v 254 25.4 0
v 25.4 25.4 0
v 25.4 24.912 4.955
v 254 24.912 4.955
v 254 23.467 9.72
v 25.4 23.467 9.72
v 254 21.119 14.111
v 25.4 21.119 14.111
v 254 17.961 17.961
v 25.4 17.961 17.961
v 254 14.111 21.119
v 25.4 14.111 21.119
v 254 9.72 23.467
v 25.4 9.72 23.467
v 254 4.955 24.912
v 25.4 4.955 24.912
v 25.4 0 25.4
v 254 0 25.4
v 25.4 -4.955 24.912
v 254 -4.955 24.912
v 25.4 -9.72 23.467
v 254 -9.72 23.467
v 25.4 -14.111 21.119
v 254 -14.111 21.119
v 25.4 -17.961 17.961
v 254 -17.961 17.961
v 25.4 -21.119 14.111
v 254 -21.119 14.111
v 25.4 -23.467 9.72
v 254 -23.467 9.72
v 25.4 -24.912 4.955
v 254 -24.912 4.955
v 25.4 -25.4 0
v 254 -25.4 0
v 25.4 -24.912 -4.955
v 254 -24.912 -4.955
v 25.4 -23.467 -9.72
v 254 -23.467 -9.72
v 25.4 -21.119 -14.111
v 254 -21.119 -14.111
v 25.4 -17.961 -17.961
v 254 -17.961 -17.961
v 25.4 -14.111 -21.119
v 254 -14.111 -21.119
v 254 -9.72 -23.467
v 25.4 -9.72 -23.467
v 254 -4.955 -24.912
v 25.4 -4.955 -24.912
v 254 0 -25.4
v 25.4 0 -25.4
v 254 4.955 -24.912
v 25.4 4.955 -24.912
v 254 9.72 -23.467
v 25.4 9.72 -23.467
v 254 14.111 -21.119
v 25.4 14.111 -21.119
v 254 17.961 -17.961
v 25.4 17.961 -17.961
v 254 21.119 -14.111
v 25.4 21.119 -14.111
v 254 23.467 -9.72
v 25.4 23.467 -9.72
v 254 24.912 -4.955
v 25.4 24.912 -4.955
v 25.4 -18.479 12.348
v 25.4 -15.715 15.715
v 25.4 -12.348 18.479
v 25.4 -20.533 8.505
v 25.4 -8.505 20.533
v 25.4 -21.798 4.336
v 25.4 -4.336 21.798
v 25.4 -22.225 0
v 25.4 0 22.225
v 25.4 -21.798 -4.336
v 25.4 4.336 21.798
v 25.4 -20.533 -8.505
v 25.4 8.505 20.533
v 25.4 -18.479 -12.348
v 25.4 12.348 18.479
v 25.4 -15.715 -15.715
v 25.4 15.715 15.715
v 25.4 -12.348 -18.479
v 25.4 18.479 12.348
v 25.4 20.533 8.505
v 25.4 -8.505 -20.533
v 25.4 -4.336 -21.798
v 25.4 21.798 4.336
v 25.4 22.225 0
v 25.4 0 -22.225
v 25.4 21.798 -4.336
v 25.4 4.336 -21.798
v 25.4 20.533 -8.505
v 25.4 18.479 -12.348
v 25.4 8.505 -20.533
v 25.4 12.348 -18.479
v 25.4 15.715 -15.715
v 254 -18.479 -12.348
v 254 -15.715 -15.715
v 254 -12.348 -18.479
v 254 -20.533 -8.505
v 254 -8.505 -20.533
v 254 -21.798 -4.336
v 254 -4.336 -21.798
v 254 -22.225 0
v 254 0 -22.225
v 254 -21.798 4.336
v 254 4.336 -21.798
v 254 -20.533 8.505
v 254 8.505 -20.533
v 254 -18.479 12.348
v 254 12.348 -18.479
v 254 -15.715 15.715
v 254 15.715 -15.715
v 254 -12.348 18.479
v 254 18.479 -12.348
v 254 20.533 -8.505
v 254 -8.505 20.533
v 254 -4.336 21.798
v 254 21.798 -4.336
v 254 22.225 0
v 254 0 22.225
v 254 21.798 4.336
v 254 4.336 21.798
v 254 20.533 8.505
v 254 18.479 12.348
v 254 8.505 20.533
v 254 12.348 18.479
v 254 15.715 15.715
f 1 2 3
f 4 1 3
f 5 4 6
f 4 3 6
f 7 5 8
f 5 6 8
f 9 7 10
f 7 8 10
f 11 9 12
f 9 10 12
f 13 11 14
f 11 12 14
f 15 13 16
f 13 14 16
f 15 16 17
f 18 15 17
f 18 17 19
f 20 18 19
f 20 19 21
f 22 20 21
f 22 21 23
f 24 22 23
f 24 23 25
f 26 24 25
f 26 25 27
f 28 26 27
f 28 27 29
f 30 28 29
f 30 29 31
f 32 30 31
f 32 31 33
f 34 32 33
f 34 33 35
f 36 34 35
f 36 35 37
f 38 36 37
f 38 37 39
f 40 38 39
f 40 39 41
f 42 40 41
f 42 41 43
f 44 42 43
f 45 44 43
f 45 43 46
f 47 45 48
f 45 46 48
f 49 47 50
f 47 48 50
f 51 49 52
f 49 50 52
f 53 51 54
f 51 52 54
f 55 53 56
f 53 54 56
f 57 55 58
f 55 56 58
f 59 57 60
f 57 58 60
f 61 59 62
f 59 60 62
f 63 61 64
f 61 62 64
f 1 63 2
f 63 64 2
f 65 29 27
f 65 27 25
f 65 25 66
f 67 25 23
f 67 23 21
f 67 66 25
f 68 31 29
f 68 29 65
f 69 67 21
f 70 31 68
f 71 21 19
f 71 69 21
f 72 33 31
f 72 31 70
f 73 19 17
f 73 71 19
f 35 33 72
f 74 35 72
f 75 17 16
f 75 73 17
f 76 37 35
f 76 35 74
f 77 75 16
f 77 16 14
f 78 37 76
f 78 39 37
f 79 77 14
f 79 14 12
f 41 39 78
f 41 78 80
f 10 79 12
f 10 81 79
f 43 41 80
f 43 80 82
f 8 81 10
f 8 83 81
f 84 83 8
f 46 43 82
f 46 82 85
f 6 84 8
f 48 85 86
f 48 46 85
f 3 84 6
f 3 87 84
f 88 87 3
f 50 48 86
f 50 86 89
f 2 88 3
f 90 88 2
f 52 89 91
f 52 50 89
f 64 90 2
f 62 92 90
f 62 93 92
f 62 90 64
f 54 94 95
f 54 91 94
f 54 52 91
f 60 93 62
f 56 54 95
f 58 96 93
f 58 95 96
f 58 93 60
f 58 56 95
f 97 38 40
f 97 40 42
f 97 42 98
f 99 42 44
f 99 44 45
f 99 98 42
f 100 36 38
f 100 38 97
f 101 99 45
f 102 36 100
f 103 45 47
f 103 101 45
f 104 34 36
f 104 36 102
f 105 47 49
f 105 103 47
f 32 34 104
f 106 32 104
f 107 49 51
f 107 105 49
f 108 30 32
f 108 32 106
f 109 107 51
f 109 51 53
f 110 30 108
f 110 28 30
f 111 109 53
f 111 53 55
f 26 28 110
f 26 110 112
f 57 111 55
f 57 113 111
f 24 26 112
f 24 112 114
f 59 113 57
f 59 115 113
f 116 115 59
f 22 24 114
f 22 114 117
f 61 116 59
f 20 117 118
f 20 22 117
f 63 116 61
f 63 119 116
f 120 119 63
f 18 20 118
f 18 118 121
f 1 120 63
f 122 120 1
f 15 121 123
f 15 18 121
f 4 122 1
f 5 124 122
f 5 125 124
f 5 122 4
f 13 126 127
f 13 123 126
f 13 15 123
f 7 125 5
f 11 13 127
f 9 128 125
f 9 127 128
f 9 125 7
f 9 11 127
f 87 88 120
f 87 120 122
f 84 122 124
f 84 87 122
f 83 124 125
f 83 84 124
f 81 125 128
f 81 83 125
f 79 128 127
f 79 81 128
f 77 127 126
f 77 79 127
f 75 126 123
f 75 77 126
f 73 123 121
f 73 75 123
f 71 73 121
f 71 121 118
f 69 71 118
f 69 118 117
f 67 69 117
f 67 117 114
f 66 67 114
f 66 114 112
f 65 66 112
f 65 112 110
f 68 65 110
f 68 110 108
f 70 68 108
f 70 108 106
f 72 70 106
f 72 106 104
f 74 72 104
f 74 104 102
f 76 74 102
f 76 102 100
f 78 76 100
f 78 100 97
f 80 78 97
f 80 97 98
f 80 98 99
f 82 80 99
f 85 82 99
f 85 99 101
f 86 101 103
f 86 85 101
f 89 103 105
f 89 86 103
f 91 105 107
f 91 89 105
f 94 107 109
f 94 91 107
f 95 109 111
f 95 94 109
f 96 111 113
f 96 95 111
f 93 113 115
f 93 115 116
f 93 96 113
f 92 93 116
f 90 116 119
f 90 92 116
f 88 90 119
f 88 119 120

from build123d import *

# Parameters (mm, degrees)
F0_R      = 25.4
F1_DEPTH  = 254
F2_T      = -3.175
F1_FACE_R = 25.4
F3_DEPTH  = 25.4


with BuildPart() as f1:
    # F0 (on Right) → F1 (new body)
    with BuildSketch(Plane.YZ):
        Circle(F0_R)
    extrude(amount=F1_DEPTH)

    # F2
    f2_openings = [f1.faces().sort_by_distance(p)[0] for p in [
        (254, 0, 0),
    ]]
    offset(amount=F2_T, openings=f2_openings)

    # F1_face (on face) → F3 (cut)
    with BuildSketch(Plane(origin=(0, 0, 0), x_dir=(0, 1, 0), z_dir=(-1, 0, 0))):
        Circle(F1_FACE_R)
    extrude(amount=-F3_DEPTH, mode=Mode.SUBTRACT)


solid = f1.part
